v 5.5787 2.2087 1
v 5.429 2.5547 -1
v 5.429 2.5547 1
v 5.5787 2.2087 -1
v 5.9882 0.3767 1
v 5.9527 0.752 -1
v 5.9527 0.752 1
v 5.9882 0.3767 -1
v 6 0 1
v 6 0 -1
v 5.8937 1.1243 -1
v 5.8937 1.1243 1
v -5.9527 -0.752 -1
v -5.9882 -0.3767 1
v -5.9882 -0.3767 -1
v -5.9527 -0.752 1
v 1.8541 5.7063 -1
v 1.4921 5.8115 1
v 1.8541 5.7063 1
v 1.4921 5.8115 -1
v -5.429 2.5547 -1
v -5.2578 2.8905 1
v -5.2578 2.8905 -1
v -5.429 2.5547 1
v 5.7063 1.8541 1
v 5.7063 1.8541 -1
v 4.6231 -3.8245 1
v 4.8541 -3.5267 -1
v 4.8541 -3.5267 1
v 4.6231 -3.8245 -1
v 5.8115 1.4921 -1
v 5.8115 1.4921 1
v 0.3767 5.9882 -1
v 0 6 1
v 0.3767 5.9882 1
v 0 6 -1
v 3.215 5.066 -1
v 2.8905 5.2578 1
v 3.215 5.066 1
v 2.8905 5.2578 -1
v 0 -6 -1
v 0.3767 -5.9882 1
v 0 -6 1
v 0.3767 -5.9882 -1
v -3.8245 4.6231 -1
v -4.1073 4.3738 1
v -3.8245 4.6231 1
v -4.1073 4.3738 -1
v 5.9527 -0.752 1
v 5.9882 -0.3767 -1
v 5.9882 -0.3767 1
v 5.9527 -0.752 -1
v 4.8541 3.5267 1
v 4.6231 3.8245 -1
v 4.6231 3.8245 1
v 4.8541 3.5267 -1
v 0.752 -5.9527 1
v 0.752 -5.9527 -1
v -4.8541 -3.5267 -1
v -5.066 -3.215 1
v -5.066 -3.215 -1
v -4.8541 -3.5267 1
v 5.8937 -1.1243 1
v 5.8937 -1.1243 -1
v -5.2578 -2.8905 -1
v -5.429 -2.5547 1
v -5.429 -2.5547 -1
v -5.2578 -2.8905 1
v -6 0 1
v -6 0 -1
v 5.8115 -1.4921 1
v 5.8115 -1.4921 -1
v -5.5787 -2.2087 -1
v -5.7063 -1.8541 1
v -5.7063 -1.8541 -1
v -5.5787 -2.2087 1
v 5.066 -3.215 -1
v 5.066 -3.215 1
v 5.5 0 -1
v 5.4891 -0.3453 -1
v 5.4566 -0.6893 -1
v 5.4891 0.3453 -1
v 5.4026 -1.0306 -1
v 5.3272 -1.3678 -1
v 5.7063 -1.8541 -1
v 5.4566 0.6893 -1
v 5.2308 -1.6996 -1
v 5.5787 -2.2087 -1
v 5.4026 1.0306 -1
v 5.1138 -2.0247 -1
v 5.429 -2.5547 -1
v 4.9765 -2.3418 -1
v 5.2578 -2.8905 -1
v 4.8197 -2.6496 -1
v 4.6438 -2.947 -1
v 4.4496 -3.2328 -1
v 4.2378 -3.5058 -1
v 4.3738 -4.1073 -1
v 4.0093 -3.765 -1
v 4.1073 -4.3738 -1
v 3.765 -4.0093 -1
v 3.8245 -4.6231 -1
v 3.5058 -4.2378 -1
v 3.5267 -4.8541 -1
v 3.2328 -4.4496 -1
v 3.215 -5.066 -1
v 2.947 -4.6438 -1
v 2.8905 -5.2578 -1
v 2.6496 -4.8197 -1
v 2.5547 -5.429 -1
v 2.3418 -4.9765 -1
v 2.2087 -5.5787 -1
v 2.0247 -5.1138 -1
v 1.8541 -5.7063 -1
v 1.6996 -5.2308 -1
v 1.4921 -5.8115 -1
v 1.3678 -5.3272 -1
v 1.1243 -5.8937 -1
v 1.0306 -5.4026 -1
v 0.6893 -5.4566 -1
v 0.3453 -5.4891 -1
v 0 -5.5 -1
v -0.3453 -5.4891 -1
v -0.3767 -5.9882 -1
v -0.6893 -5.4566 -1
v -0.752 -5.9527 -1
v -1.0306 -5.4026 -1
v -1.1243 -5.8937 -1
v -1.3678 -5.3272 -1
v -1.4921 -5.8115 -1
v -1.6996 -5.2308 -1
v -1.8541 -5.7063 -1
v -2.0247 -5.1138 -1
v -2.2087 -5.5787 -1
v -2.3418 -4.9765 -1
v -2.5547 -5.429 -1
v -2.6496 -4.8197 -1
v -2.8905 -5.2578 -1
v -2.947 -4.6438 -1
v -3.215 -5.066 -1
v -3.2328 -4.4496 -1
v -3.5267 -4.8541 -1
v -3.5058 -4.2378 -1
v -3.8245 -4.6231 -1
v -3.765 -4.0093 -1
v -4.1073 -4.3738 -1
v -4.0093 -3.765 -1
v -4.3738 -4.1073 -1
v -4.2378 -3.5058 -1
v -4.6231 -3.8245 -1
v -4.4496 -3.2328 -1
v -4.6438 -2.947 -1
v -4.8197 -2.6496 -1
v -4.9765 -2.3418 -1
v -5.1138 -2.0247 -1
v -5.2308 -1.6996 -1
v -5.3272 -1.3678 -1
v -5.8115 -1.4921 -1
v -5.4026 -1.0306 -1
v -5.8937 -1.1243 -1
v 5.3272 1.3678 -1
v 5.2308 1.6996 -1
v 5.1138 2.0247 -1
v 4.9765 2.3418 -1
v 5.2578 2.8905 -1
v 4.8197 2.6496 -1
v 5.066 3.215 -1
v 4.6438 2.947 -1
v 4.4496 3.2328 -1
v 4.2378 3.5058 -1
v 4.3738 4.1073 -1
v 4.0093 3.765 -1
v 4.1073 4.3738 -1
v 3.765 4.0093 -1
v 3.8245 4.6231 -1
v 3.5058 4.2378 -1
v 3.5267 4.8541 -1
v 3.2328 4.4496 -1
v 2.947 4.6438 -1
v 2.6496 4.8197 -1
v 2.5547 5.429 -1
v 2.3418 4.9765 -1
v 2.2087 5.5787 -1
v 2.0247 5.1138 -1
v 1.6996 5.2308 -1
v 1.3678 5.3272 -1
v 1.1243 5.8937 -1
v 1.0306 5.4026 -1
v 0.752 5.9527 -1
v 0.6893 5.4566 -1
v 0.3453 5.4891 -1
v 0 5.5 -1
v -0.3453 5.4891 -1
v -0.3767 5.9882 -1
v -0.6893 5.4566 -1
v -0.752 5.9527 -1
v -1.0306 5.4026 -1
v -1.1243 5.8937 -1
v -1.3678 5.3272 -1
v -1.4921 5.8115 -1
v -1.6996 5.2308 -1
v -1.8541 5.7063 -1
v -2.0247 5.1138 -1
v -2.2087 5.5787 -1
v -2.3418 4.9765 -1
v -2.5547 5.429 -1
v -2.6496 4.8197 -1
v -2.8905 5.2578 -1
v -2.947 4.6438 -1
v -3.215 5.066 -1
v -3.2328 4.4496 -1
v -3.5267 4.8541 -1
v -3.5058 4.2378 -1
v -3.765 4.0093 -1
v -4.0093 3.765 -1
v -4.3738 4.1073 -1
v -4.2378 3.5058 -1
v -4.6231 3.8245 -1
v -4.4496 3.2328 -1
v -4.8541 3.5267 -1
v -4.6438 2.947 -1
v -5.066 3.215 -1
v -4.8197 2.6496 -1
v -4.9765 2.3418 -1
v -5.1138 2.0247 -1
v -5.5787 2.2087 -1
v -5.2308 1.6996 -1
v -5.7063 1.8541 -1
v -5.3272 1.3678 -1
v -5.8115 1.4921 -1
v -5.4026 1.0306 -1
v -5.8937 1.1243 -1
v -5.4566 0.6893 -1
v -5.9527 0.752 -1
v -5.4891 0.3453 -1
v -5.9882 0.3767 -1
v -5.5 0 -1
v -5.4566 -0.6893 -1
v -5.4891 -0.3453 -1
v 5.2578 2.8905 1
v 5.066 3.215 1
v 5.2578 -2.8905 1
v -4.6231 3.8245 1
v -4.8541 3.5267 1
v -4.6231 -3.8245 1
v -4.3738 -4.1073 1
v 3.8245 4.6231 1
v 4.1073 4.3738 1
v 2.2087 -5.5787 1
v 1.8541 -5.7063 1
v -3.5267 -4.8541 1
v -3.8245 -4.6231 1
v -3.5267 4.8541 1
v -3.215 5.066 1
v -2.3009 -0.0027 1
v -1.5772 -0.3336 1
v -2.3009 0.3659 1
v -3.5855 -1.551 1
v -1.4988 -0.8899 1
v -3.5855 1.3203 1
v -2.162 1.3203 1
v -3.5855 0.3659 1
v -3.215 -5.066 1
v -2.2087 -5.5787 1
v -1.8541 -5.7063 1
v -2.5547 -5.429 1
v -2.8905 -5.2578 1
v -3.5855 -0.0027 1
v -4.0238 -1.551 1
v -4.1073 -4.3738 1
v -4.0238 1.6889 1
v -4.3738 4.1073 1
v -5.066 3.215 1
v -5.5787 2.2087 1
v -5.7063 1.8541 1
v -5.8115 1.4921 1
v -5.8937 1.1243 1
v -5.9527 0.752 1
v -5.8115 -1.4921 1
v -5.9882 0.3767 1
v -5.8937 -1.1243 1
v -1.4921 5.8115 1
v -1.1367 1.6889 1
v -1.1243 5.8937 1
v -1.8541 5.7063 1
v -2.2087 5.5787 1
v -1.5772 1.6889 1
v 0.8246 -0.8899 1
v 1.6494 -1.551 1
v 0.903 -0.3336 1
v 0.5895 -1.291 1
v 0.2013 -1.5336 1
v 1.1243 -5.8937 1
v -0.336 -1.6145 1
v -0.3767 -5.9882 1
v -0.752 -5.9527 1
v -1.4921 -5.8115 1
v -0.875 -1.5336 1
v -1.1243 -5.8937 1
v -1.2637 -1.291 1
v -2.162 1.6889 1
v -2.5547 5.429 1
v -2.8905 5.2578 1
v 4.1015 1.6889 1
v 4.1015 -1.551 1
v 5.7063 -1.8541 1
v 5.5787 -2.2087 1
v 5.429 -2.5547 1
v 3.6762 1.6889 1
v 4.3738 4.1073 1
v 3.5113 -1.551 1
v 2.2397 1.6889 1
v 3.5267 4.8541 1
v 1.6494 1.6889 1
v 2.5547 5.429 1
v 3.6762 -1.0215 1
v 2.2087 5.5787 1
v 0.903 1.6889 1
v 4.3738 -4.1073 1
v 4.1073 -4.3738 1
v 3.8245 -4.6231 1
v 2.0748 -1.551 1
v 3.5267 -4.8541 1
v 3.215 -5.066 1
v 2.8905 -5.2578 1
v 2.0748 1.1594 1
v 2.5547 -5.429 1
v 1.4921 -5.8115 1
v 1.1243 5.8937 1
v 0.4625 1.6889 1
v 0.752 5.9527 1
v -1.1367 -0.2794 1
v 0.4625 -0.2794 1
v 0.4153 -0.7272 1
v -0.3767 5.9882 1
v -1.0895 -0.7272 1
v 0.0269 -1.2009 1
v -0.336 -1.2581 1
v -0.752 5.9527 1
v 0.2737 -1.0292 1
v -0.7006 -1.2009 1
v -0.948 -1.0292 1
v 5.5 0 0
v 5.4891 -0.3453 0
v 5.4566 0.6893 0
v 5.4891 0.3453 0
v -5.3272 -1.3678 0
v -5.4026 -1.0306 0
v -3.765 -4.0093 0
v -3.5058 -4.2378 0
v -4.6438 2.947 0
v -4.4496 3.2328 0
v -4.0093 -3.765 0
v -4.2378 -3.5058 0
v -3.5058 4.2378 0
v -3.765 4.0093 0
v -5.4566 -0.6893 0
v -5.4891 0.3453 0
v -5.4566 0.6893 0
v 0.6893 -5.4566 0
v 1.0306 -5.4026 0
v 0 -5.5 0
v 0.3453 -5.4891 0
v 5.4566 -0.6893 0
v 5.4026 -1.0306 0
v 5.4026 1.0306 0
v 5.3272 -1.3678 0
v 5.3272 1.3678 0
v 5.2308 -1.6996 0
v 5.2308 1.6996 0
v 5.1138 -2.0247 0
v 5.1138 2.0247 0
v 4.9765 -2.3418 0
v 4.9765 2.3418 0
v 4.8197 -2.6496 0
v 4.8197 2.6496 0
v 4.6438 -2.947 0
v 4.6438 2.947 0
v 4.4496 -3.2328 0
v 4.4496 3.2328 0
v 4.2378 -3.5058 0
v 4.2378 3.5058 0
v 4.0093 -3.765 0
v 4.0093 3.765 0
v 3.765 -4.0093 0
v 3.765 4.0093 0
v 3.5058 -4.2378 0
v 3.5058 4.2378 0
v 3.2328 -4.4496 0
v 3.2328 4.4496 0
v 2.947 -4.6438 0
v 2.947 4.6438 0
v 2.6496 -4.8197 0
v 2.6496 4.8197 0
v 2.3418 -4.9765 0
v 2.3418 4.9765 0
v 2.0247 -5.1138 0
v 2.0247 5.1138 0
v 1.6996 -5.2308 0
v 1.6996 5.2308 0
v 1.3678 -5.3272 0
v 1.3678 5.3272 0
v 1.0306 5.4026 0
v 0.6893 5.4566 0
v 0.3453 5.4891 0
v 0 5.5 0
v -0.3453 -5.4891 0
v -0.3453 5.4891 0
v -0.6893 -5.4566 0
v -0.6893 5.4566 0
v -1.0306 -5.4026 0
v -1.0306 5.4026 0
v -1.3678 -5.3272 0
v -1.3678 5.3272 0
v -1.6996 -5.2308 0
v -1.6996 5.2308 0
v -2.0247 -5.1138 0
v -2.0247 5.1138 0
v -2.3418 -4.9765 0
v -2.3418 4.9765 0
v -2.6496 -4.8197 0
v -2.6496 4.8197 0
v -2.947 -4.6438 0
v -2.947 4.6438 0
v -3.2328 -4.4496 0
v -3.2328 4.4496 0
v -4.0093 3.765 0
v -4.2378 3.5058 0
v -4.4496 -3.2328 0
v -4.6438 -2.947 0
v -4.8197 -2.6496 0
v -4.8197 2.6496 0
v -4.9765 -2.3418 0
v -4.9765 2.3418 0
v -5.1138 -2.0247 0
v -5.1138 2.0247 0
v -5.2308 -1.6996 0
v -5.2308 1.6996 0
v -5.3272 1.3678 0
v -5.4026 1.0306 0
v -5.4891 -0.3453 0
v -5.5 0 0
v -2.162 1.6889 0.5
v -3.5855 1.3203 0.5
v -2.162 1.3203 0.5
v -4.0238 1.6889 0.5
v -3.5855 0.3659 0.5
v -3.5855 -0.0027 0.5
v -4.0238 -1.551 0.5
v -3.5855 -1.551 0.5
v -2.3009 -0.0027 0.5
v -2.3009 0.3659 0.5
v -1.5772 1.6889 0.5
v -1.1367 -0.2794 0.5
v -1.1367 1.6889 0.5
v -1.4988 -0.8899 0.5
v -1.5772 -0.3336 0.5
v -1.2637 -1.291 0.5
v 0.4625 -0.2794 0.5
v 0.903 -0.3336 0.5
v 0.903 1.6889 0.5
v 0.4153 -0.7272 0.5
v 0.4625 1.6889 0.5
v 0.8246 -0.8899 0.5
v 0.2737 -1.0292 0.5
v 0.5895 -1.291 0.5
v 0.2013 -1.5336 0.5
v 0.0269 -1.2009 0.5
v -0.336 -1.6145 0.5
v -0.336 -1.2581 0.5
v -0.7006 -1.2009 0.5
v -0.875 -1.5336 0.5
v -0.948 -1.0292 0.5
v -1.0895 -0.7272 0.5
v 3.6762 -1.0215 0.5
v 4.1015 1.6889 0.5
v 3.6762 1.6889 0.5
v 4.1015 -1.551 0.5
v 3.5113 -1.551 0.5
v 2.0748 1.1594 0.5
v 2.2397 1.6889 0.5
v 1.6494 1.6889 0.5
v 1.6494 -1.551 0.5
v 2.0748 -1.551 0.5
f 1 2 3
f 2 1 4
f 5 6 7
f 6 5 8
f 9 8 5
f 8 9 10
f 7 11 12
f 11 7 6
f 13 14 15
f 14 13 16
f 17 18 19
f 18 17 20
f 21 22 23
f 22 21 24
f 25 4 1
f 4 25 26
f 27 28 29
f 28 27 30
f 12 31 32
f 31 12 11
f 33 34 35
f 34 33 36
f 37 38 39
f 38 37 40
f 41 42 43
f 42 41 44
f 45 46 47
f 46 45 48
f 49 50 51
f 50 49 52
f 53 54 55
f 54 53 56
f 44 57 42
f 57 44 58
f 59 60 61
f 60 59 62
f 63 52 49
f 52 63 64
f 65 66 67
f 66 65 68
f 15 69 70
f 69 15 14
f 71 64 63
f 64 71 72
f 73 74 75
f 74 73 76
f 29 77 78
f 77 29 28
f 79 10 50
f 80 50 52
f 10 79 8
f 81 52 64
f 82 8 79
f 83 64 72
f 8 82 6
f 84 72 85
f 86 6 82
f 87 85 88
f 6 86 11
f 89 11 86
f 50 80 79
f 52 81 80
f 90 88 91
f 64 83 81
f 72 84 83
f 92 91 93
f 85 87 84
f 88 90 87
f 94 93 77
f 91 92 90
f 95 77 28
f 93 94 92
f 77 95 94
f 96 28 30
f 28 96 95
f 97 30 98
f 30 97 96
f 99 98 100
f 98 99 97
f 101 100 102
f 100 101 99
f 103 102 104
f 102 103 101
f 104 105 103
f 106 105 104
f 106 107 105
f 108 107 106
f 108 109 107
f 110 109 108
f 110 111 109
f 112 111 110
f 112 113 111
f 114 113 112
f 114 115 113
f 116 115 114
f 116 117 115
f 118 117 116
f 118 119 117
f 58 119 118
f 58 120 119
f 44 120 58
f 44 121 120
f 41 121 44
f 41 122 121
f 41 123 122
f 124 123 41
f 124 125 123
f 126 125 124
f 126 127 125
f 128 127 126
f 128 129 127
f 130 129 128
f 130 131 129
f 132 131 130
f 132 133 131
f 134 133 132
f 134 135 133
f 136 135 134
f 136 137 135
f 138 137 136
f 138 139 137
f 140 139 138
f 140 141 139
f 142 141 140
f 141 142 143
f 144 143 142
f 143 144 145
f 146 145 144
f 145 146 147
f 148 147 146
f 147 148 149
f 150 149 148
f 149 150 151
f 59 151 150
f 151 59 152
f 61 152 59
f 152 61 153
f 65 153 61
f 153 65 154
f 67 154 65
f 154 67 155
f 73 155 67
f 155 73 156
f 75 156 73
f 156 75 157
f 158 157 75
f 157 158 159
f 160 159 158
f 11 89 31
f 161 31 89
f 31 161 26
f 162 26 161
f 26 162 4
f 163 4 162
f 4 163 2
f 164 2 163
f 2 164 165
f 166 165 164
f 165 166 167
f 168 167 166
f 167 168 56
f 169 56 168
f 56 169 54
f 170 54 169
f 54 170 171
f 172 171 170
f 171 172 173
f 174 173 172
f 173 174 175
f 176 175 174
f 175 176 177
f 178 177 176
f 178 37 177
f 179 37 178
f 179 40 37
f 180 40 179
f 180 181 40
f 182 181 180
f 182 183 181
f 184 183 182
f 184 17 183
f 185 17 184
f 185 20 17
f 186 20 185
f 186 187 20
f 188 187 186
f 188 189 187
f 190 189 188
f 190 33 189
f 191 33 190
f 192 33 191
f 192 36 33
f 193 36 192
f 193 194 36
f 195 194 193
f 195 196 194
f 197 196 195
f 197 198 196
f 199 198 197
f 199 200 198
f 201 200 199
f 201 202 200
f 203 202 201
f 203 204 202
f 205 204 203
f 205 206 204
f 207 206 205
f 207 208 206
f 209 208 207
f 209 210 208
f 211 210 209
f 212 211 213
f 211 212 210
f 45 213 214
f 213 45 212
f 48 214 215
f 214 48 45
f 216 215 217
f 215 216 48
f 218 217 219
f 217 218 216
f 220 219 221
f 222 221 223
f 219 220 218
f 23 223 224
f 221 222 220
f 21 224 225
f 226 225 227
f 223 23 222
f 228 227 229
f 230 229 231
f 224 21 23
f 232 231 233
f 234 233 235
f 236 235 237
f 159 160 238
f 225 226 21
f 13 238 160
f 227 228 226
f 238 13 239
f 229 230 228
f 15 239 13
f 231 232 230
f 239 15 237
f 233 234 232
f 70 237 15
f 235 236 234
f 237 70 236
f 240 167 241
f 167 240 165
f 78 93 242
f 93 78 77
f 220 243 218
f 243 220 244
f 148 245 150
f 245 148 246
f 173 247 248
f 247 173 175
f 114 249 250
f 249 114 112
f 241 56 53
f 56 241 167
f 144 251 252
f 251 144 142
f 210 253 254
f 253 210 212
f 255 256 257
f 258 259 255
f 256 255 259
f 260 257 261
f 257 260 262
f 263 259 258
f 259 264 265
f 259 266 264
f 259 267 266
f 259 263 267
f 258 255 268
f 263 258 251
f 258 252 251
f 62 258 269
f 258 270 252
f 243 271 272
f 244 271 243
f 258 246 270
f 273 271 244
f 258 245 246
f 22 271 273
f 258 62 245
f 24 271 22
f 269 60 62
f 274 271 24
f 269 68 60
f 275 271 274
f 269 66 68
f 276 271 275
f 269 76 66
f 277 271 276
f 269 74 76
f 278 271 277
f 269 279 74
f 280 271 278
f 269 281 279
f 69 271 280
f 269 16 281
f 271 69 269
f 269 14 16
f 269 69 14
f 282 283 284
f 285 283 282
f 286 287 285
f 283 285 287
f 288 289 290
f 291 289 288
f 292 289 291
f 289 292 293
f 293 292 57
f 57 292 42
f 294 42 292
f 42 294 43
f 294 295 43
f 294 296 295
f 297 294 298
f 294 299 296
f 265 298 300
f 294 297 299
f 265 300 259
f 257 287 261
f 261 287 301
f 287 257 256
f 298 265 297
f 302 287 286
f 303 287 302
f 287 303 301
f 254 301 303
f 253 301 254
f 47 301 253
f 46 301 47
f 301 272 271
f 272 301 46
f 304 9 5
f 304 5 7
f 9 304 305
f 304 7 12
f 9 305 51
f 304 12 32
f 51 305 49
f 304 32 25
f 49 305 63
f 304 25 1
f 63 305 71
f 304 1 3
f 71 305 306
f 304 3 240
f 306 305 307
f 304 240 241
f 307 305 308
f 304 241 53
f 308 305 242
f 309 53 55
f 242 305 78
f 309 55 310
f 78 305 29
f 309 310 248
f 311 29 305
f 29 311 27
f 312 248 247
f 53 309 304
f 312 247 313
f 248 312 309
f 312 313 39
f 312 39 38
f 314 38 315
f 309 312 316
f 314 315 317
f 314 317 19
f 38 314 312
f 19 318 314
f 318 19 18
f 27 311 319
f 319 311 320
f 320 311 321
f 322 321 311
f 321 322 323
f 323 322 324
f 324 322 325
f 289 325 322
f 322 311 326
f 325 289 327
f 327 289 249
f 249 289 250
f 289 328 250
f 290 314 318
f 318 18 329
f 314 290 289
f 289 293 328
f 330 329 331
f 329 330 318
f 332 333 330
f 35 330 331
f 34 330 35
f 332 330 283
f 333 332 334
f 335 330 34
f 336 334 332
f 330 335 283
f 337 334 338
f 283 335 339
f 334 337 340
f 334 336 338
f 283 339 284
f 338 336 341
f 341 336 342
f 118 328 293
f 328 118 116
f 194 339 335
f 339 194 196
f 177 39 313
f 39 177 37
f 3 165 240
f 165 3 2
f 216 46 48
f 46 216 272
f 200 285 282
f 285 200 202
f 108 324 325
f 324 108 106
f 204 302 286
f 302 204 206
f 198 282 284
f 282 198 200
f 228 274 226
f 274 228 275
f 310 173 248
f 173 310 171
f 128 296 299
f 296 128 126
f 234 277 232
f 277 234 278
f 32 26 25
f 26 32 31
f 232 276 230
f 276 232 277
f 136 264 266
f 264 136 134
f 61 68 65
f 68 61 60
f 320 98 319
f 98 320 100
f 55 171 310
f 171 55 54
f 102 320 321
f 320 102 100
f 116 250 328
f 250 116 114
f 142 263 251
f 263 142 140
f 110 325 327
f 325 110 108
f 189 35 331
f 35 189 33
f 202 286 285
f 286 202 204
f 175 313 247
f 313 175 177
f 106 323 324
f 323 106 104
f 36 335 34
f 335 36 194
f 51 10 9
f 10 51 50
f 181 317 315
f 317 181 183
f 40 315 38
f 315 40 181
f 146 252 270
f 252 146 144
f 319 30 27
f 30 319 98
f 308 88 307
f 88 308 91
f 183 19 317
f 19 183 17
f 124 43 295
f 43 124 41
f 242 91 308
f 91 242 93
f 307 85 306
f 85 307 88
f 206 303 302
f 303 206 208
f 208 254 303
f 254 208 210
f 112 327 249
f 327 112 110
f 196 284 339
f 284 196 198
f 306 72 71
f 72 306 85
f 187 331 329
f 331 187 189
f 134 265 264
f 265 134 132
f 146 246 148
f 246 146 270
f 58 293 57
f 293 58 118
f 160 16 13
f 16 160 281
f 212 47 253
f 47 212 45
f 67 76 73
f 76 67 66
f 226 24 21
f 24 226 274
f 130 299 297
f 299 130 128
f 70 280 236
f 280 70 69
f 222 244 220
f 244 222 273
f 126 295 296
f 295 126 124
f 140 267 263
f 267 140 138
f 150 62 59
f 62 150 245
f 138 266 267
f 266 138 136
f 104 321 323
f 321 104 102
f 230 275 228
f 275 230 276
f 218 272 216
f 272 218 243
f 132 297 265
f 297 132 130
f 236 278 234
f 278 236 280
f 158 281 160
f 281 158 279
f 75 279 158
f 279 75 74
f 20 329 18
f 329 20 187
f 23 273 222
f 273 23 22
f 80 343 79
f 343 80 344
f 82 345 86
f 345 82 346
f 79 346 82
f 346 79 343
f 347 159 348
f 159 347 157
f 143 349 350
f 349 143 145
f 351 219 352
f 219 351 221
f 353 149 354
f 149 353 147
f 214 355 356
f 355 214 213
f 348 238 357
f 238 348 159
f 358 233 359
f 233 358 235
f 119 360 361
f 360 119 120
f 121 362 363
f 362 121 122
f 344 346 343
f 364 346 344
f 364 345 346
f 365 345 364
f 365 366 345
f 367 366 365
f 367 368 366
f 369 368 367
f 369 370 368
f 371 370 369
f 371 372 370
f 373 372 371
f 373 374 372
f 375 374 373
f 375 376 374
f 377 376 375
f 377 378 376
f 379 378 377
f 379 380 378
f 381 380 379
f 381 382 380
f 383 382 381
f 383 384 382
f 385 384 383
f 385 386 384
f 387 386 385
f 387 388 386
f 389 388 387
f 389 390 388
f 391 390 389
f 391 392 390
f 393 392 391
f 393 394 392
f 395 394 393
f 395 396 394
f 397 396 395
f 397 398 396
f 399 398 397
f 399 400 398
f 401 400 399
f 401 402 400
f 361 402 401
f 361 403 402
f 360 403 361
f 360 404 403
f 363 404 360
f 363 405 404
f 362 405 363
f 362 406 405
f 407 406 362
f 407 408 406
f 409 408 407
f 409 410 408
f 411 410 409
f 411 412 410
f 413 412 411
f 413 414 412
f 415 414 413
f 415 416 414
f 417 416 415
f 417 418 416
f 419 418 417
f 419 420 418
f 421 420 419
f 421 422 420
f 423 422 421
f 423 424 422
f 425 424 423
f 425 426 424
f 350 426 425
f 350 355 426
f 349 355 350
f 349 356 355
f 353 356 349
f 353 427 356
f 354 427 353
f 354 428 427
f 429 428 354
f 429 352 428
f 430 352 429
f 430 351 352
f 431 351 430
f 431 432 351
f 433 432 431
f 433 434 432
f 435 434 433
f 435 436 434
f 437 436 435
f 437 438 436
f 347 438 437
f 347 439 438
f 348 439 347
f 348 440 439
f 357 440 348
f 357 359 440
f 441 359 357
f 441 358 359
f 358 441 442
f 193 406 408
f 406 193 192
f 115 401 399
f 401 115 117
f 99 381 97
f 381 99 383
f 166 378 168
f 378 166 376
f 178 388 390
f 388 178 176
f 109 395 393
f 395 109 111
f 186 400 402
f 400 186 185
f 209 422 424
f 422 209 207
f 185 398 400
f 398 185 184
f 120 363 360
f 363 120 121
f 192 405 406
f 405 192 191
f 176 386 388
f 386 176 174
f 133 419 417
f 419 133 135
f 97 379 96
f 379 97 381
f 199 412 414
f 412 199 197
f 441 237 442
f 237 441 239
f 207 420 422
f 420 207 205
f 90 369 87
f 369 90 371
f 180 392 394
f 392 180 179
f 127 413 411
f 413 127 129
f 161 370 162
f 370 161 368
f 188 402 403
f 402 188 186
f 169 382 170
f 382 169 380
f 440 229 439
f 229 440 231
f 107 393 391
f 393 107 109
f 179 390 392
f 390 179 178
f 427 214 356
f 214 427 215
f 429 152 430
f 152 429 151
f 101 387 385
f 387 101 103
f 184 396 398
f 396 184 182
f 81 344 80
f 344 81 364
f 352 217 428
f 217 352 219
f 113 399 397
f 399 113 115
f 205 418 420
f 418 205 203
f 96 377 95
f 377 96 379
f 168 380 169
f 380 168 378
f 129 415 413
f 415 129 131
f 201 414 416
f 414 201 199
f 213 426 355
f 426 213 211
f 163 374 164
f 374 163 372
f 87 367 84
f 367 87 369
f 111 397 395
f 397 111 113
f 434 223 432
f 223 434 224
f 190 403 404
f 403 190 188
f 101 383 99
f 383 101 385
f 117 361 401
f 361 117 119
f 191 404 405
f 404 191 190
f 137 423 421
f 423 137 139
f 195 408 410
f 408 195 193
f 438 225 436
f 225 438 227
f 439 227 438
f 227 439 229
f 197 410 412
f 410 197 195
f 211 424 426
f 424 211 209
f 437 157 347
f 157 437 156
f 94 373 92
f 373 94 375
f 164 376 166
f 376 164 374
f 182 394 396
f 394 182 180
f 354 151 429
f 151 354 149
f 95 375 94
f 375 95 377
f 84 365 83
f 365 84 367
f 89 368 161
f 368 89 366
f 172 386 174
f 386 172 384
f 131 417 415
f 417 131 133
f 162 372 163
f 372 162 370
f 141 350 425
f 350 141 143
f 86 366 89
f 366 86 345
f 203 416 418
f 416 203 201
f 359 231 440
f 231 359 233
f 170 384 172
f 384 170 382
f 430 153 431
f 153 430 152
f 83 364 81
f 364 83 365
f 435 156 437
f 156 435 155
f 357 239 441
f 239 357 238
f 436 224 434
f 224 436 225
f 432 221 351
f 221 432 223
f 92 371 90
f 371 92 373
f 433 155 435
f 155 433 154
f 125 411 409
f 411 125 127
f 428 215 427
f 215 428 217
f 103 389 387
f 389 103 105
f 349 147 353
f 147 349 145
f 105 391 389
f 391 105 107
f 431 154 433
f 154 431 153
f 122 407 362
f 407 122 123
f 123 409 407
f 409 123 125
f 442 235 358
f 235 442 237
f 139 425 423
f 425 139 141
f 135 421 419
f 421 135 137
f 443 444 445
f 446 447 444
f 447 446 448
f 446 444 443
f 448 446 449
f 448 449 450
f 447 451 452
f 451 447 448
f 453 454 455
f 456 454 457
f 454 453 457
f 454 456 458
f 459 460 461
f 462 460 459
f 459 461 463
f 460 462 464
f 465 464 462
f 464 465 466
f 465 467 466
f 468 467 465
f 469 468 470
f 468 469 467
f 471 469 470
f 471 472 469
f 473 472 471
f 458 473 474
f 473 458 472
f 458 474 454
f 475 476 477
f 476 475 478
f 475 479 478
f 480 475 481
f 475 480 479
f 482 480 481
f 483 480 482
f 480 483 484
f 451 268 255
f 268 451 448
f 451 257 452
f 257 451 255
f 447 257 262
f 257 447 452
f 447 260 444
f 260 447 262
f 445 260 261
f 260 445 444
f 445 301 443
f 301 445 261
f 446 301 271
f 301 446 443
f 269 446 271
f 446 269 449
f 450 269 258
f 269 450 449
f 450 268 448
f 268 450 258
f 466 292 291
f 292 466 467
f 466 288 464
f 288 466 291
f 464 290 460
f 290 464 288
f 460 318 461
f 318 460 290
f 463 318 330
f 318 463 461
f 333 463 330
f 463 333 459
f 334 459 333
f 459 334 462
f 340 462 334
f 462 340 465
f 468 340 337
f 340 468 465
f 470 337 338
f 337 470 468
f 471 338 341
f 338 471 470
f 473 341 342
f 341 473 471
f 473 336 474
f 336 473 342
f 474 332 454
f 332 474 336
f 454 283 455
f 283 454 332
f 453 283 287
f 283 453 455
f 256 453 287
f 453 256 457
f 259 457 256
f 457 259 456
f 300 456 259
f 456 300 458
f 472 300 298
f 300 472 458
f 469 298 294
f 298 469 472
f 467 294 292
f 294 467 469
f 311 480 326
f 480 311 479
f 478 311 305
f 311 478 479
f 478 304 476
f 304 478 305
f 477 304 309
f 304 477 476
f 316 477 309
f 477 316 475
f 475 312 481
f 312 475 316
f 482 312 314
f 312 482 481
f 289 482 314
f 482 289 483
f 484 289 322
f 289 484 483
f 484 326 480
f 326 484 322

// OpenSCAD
difference(){
    difference() {
        cylinder (h = 2, r=6, center = true, $fn=100);
        translate([0,0,-1.5])
            cylinder (h = 3, r=5.5, center = true, $fn=100);
    }
    translate([0,0,.5]){
        linear_extrude(height=1)
            text("FUN", font="Permanent Marker:style=Regular", size=3.2, halign="center", valign="center");
    }
}
